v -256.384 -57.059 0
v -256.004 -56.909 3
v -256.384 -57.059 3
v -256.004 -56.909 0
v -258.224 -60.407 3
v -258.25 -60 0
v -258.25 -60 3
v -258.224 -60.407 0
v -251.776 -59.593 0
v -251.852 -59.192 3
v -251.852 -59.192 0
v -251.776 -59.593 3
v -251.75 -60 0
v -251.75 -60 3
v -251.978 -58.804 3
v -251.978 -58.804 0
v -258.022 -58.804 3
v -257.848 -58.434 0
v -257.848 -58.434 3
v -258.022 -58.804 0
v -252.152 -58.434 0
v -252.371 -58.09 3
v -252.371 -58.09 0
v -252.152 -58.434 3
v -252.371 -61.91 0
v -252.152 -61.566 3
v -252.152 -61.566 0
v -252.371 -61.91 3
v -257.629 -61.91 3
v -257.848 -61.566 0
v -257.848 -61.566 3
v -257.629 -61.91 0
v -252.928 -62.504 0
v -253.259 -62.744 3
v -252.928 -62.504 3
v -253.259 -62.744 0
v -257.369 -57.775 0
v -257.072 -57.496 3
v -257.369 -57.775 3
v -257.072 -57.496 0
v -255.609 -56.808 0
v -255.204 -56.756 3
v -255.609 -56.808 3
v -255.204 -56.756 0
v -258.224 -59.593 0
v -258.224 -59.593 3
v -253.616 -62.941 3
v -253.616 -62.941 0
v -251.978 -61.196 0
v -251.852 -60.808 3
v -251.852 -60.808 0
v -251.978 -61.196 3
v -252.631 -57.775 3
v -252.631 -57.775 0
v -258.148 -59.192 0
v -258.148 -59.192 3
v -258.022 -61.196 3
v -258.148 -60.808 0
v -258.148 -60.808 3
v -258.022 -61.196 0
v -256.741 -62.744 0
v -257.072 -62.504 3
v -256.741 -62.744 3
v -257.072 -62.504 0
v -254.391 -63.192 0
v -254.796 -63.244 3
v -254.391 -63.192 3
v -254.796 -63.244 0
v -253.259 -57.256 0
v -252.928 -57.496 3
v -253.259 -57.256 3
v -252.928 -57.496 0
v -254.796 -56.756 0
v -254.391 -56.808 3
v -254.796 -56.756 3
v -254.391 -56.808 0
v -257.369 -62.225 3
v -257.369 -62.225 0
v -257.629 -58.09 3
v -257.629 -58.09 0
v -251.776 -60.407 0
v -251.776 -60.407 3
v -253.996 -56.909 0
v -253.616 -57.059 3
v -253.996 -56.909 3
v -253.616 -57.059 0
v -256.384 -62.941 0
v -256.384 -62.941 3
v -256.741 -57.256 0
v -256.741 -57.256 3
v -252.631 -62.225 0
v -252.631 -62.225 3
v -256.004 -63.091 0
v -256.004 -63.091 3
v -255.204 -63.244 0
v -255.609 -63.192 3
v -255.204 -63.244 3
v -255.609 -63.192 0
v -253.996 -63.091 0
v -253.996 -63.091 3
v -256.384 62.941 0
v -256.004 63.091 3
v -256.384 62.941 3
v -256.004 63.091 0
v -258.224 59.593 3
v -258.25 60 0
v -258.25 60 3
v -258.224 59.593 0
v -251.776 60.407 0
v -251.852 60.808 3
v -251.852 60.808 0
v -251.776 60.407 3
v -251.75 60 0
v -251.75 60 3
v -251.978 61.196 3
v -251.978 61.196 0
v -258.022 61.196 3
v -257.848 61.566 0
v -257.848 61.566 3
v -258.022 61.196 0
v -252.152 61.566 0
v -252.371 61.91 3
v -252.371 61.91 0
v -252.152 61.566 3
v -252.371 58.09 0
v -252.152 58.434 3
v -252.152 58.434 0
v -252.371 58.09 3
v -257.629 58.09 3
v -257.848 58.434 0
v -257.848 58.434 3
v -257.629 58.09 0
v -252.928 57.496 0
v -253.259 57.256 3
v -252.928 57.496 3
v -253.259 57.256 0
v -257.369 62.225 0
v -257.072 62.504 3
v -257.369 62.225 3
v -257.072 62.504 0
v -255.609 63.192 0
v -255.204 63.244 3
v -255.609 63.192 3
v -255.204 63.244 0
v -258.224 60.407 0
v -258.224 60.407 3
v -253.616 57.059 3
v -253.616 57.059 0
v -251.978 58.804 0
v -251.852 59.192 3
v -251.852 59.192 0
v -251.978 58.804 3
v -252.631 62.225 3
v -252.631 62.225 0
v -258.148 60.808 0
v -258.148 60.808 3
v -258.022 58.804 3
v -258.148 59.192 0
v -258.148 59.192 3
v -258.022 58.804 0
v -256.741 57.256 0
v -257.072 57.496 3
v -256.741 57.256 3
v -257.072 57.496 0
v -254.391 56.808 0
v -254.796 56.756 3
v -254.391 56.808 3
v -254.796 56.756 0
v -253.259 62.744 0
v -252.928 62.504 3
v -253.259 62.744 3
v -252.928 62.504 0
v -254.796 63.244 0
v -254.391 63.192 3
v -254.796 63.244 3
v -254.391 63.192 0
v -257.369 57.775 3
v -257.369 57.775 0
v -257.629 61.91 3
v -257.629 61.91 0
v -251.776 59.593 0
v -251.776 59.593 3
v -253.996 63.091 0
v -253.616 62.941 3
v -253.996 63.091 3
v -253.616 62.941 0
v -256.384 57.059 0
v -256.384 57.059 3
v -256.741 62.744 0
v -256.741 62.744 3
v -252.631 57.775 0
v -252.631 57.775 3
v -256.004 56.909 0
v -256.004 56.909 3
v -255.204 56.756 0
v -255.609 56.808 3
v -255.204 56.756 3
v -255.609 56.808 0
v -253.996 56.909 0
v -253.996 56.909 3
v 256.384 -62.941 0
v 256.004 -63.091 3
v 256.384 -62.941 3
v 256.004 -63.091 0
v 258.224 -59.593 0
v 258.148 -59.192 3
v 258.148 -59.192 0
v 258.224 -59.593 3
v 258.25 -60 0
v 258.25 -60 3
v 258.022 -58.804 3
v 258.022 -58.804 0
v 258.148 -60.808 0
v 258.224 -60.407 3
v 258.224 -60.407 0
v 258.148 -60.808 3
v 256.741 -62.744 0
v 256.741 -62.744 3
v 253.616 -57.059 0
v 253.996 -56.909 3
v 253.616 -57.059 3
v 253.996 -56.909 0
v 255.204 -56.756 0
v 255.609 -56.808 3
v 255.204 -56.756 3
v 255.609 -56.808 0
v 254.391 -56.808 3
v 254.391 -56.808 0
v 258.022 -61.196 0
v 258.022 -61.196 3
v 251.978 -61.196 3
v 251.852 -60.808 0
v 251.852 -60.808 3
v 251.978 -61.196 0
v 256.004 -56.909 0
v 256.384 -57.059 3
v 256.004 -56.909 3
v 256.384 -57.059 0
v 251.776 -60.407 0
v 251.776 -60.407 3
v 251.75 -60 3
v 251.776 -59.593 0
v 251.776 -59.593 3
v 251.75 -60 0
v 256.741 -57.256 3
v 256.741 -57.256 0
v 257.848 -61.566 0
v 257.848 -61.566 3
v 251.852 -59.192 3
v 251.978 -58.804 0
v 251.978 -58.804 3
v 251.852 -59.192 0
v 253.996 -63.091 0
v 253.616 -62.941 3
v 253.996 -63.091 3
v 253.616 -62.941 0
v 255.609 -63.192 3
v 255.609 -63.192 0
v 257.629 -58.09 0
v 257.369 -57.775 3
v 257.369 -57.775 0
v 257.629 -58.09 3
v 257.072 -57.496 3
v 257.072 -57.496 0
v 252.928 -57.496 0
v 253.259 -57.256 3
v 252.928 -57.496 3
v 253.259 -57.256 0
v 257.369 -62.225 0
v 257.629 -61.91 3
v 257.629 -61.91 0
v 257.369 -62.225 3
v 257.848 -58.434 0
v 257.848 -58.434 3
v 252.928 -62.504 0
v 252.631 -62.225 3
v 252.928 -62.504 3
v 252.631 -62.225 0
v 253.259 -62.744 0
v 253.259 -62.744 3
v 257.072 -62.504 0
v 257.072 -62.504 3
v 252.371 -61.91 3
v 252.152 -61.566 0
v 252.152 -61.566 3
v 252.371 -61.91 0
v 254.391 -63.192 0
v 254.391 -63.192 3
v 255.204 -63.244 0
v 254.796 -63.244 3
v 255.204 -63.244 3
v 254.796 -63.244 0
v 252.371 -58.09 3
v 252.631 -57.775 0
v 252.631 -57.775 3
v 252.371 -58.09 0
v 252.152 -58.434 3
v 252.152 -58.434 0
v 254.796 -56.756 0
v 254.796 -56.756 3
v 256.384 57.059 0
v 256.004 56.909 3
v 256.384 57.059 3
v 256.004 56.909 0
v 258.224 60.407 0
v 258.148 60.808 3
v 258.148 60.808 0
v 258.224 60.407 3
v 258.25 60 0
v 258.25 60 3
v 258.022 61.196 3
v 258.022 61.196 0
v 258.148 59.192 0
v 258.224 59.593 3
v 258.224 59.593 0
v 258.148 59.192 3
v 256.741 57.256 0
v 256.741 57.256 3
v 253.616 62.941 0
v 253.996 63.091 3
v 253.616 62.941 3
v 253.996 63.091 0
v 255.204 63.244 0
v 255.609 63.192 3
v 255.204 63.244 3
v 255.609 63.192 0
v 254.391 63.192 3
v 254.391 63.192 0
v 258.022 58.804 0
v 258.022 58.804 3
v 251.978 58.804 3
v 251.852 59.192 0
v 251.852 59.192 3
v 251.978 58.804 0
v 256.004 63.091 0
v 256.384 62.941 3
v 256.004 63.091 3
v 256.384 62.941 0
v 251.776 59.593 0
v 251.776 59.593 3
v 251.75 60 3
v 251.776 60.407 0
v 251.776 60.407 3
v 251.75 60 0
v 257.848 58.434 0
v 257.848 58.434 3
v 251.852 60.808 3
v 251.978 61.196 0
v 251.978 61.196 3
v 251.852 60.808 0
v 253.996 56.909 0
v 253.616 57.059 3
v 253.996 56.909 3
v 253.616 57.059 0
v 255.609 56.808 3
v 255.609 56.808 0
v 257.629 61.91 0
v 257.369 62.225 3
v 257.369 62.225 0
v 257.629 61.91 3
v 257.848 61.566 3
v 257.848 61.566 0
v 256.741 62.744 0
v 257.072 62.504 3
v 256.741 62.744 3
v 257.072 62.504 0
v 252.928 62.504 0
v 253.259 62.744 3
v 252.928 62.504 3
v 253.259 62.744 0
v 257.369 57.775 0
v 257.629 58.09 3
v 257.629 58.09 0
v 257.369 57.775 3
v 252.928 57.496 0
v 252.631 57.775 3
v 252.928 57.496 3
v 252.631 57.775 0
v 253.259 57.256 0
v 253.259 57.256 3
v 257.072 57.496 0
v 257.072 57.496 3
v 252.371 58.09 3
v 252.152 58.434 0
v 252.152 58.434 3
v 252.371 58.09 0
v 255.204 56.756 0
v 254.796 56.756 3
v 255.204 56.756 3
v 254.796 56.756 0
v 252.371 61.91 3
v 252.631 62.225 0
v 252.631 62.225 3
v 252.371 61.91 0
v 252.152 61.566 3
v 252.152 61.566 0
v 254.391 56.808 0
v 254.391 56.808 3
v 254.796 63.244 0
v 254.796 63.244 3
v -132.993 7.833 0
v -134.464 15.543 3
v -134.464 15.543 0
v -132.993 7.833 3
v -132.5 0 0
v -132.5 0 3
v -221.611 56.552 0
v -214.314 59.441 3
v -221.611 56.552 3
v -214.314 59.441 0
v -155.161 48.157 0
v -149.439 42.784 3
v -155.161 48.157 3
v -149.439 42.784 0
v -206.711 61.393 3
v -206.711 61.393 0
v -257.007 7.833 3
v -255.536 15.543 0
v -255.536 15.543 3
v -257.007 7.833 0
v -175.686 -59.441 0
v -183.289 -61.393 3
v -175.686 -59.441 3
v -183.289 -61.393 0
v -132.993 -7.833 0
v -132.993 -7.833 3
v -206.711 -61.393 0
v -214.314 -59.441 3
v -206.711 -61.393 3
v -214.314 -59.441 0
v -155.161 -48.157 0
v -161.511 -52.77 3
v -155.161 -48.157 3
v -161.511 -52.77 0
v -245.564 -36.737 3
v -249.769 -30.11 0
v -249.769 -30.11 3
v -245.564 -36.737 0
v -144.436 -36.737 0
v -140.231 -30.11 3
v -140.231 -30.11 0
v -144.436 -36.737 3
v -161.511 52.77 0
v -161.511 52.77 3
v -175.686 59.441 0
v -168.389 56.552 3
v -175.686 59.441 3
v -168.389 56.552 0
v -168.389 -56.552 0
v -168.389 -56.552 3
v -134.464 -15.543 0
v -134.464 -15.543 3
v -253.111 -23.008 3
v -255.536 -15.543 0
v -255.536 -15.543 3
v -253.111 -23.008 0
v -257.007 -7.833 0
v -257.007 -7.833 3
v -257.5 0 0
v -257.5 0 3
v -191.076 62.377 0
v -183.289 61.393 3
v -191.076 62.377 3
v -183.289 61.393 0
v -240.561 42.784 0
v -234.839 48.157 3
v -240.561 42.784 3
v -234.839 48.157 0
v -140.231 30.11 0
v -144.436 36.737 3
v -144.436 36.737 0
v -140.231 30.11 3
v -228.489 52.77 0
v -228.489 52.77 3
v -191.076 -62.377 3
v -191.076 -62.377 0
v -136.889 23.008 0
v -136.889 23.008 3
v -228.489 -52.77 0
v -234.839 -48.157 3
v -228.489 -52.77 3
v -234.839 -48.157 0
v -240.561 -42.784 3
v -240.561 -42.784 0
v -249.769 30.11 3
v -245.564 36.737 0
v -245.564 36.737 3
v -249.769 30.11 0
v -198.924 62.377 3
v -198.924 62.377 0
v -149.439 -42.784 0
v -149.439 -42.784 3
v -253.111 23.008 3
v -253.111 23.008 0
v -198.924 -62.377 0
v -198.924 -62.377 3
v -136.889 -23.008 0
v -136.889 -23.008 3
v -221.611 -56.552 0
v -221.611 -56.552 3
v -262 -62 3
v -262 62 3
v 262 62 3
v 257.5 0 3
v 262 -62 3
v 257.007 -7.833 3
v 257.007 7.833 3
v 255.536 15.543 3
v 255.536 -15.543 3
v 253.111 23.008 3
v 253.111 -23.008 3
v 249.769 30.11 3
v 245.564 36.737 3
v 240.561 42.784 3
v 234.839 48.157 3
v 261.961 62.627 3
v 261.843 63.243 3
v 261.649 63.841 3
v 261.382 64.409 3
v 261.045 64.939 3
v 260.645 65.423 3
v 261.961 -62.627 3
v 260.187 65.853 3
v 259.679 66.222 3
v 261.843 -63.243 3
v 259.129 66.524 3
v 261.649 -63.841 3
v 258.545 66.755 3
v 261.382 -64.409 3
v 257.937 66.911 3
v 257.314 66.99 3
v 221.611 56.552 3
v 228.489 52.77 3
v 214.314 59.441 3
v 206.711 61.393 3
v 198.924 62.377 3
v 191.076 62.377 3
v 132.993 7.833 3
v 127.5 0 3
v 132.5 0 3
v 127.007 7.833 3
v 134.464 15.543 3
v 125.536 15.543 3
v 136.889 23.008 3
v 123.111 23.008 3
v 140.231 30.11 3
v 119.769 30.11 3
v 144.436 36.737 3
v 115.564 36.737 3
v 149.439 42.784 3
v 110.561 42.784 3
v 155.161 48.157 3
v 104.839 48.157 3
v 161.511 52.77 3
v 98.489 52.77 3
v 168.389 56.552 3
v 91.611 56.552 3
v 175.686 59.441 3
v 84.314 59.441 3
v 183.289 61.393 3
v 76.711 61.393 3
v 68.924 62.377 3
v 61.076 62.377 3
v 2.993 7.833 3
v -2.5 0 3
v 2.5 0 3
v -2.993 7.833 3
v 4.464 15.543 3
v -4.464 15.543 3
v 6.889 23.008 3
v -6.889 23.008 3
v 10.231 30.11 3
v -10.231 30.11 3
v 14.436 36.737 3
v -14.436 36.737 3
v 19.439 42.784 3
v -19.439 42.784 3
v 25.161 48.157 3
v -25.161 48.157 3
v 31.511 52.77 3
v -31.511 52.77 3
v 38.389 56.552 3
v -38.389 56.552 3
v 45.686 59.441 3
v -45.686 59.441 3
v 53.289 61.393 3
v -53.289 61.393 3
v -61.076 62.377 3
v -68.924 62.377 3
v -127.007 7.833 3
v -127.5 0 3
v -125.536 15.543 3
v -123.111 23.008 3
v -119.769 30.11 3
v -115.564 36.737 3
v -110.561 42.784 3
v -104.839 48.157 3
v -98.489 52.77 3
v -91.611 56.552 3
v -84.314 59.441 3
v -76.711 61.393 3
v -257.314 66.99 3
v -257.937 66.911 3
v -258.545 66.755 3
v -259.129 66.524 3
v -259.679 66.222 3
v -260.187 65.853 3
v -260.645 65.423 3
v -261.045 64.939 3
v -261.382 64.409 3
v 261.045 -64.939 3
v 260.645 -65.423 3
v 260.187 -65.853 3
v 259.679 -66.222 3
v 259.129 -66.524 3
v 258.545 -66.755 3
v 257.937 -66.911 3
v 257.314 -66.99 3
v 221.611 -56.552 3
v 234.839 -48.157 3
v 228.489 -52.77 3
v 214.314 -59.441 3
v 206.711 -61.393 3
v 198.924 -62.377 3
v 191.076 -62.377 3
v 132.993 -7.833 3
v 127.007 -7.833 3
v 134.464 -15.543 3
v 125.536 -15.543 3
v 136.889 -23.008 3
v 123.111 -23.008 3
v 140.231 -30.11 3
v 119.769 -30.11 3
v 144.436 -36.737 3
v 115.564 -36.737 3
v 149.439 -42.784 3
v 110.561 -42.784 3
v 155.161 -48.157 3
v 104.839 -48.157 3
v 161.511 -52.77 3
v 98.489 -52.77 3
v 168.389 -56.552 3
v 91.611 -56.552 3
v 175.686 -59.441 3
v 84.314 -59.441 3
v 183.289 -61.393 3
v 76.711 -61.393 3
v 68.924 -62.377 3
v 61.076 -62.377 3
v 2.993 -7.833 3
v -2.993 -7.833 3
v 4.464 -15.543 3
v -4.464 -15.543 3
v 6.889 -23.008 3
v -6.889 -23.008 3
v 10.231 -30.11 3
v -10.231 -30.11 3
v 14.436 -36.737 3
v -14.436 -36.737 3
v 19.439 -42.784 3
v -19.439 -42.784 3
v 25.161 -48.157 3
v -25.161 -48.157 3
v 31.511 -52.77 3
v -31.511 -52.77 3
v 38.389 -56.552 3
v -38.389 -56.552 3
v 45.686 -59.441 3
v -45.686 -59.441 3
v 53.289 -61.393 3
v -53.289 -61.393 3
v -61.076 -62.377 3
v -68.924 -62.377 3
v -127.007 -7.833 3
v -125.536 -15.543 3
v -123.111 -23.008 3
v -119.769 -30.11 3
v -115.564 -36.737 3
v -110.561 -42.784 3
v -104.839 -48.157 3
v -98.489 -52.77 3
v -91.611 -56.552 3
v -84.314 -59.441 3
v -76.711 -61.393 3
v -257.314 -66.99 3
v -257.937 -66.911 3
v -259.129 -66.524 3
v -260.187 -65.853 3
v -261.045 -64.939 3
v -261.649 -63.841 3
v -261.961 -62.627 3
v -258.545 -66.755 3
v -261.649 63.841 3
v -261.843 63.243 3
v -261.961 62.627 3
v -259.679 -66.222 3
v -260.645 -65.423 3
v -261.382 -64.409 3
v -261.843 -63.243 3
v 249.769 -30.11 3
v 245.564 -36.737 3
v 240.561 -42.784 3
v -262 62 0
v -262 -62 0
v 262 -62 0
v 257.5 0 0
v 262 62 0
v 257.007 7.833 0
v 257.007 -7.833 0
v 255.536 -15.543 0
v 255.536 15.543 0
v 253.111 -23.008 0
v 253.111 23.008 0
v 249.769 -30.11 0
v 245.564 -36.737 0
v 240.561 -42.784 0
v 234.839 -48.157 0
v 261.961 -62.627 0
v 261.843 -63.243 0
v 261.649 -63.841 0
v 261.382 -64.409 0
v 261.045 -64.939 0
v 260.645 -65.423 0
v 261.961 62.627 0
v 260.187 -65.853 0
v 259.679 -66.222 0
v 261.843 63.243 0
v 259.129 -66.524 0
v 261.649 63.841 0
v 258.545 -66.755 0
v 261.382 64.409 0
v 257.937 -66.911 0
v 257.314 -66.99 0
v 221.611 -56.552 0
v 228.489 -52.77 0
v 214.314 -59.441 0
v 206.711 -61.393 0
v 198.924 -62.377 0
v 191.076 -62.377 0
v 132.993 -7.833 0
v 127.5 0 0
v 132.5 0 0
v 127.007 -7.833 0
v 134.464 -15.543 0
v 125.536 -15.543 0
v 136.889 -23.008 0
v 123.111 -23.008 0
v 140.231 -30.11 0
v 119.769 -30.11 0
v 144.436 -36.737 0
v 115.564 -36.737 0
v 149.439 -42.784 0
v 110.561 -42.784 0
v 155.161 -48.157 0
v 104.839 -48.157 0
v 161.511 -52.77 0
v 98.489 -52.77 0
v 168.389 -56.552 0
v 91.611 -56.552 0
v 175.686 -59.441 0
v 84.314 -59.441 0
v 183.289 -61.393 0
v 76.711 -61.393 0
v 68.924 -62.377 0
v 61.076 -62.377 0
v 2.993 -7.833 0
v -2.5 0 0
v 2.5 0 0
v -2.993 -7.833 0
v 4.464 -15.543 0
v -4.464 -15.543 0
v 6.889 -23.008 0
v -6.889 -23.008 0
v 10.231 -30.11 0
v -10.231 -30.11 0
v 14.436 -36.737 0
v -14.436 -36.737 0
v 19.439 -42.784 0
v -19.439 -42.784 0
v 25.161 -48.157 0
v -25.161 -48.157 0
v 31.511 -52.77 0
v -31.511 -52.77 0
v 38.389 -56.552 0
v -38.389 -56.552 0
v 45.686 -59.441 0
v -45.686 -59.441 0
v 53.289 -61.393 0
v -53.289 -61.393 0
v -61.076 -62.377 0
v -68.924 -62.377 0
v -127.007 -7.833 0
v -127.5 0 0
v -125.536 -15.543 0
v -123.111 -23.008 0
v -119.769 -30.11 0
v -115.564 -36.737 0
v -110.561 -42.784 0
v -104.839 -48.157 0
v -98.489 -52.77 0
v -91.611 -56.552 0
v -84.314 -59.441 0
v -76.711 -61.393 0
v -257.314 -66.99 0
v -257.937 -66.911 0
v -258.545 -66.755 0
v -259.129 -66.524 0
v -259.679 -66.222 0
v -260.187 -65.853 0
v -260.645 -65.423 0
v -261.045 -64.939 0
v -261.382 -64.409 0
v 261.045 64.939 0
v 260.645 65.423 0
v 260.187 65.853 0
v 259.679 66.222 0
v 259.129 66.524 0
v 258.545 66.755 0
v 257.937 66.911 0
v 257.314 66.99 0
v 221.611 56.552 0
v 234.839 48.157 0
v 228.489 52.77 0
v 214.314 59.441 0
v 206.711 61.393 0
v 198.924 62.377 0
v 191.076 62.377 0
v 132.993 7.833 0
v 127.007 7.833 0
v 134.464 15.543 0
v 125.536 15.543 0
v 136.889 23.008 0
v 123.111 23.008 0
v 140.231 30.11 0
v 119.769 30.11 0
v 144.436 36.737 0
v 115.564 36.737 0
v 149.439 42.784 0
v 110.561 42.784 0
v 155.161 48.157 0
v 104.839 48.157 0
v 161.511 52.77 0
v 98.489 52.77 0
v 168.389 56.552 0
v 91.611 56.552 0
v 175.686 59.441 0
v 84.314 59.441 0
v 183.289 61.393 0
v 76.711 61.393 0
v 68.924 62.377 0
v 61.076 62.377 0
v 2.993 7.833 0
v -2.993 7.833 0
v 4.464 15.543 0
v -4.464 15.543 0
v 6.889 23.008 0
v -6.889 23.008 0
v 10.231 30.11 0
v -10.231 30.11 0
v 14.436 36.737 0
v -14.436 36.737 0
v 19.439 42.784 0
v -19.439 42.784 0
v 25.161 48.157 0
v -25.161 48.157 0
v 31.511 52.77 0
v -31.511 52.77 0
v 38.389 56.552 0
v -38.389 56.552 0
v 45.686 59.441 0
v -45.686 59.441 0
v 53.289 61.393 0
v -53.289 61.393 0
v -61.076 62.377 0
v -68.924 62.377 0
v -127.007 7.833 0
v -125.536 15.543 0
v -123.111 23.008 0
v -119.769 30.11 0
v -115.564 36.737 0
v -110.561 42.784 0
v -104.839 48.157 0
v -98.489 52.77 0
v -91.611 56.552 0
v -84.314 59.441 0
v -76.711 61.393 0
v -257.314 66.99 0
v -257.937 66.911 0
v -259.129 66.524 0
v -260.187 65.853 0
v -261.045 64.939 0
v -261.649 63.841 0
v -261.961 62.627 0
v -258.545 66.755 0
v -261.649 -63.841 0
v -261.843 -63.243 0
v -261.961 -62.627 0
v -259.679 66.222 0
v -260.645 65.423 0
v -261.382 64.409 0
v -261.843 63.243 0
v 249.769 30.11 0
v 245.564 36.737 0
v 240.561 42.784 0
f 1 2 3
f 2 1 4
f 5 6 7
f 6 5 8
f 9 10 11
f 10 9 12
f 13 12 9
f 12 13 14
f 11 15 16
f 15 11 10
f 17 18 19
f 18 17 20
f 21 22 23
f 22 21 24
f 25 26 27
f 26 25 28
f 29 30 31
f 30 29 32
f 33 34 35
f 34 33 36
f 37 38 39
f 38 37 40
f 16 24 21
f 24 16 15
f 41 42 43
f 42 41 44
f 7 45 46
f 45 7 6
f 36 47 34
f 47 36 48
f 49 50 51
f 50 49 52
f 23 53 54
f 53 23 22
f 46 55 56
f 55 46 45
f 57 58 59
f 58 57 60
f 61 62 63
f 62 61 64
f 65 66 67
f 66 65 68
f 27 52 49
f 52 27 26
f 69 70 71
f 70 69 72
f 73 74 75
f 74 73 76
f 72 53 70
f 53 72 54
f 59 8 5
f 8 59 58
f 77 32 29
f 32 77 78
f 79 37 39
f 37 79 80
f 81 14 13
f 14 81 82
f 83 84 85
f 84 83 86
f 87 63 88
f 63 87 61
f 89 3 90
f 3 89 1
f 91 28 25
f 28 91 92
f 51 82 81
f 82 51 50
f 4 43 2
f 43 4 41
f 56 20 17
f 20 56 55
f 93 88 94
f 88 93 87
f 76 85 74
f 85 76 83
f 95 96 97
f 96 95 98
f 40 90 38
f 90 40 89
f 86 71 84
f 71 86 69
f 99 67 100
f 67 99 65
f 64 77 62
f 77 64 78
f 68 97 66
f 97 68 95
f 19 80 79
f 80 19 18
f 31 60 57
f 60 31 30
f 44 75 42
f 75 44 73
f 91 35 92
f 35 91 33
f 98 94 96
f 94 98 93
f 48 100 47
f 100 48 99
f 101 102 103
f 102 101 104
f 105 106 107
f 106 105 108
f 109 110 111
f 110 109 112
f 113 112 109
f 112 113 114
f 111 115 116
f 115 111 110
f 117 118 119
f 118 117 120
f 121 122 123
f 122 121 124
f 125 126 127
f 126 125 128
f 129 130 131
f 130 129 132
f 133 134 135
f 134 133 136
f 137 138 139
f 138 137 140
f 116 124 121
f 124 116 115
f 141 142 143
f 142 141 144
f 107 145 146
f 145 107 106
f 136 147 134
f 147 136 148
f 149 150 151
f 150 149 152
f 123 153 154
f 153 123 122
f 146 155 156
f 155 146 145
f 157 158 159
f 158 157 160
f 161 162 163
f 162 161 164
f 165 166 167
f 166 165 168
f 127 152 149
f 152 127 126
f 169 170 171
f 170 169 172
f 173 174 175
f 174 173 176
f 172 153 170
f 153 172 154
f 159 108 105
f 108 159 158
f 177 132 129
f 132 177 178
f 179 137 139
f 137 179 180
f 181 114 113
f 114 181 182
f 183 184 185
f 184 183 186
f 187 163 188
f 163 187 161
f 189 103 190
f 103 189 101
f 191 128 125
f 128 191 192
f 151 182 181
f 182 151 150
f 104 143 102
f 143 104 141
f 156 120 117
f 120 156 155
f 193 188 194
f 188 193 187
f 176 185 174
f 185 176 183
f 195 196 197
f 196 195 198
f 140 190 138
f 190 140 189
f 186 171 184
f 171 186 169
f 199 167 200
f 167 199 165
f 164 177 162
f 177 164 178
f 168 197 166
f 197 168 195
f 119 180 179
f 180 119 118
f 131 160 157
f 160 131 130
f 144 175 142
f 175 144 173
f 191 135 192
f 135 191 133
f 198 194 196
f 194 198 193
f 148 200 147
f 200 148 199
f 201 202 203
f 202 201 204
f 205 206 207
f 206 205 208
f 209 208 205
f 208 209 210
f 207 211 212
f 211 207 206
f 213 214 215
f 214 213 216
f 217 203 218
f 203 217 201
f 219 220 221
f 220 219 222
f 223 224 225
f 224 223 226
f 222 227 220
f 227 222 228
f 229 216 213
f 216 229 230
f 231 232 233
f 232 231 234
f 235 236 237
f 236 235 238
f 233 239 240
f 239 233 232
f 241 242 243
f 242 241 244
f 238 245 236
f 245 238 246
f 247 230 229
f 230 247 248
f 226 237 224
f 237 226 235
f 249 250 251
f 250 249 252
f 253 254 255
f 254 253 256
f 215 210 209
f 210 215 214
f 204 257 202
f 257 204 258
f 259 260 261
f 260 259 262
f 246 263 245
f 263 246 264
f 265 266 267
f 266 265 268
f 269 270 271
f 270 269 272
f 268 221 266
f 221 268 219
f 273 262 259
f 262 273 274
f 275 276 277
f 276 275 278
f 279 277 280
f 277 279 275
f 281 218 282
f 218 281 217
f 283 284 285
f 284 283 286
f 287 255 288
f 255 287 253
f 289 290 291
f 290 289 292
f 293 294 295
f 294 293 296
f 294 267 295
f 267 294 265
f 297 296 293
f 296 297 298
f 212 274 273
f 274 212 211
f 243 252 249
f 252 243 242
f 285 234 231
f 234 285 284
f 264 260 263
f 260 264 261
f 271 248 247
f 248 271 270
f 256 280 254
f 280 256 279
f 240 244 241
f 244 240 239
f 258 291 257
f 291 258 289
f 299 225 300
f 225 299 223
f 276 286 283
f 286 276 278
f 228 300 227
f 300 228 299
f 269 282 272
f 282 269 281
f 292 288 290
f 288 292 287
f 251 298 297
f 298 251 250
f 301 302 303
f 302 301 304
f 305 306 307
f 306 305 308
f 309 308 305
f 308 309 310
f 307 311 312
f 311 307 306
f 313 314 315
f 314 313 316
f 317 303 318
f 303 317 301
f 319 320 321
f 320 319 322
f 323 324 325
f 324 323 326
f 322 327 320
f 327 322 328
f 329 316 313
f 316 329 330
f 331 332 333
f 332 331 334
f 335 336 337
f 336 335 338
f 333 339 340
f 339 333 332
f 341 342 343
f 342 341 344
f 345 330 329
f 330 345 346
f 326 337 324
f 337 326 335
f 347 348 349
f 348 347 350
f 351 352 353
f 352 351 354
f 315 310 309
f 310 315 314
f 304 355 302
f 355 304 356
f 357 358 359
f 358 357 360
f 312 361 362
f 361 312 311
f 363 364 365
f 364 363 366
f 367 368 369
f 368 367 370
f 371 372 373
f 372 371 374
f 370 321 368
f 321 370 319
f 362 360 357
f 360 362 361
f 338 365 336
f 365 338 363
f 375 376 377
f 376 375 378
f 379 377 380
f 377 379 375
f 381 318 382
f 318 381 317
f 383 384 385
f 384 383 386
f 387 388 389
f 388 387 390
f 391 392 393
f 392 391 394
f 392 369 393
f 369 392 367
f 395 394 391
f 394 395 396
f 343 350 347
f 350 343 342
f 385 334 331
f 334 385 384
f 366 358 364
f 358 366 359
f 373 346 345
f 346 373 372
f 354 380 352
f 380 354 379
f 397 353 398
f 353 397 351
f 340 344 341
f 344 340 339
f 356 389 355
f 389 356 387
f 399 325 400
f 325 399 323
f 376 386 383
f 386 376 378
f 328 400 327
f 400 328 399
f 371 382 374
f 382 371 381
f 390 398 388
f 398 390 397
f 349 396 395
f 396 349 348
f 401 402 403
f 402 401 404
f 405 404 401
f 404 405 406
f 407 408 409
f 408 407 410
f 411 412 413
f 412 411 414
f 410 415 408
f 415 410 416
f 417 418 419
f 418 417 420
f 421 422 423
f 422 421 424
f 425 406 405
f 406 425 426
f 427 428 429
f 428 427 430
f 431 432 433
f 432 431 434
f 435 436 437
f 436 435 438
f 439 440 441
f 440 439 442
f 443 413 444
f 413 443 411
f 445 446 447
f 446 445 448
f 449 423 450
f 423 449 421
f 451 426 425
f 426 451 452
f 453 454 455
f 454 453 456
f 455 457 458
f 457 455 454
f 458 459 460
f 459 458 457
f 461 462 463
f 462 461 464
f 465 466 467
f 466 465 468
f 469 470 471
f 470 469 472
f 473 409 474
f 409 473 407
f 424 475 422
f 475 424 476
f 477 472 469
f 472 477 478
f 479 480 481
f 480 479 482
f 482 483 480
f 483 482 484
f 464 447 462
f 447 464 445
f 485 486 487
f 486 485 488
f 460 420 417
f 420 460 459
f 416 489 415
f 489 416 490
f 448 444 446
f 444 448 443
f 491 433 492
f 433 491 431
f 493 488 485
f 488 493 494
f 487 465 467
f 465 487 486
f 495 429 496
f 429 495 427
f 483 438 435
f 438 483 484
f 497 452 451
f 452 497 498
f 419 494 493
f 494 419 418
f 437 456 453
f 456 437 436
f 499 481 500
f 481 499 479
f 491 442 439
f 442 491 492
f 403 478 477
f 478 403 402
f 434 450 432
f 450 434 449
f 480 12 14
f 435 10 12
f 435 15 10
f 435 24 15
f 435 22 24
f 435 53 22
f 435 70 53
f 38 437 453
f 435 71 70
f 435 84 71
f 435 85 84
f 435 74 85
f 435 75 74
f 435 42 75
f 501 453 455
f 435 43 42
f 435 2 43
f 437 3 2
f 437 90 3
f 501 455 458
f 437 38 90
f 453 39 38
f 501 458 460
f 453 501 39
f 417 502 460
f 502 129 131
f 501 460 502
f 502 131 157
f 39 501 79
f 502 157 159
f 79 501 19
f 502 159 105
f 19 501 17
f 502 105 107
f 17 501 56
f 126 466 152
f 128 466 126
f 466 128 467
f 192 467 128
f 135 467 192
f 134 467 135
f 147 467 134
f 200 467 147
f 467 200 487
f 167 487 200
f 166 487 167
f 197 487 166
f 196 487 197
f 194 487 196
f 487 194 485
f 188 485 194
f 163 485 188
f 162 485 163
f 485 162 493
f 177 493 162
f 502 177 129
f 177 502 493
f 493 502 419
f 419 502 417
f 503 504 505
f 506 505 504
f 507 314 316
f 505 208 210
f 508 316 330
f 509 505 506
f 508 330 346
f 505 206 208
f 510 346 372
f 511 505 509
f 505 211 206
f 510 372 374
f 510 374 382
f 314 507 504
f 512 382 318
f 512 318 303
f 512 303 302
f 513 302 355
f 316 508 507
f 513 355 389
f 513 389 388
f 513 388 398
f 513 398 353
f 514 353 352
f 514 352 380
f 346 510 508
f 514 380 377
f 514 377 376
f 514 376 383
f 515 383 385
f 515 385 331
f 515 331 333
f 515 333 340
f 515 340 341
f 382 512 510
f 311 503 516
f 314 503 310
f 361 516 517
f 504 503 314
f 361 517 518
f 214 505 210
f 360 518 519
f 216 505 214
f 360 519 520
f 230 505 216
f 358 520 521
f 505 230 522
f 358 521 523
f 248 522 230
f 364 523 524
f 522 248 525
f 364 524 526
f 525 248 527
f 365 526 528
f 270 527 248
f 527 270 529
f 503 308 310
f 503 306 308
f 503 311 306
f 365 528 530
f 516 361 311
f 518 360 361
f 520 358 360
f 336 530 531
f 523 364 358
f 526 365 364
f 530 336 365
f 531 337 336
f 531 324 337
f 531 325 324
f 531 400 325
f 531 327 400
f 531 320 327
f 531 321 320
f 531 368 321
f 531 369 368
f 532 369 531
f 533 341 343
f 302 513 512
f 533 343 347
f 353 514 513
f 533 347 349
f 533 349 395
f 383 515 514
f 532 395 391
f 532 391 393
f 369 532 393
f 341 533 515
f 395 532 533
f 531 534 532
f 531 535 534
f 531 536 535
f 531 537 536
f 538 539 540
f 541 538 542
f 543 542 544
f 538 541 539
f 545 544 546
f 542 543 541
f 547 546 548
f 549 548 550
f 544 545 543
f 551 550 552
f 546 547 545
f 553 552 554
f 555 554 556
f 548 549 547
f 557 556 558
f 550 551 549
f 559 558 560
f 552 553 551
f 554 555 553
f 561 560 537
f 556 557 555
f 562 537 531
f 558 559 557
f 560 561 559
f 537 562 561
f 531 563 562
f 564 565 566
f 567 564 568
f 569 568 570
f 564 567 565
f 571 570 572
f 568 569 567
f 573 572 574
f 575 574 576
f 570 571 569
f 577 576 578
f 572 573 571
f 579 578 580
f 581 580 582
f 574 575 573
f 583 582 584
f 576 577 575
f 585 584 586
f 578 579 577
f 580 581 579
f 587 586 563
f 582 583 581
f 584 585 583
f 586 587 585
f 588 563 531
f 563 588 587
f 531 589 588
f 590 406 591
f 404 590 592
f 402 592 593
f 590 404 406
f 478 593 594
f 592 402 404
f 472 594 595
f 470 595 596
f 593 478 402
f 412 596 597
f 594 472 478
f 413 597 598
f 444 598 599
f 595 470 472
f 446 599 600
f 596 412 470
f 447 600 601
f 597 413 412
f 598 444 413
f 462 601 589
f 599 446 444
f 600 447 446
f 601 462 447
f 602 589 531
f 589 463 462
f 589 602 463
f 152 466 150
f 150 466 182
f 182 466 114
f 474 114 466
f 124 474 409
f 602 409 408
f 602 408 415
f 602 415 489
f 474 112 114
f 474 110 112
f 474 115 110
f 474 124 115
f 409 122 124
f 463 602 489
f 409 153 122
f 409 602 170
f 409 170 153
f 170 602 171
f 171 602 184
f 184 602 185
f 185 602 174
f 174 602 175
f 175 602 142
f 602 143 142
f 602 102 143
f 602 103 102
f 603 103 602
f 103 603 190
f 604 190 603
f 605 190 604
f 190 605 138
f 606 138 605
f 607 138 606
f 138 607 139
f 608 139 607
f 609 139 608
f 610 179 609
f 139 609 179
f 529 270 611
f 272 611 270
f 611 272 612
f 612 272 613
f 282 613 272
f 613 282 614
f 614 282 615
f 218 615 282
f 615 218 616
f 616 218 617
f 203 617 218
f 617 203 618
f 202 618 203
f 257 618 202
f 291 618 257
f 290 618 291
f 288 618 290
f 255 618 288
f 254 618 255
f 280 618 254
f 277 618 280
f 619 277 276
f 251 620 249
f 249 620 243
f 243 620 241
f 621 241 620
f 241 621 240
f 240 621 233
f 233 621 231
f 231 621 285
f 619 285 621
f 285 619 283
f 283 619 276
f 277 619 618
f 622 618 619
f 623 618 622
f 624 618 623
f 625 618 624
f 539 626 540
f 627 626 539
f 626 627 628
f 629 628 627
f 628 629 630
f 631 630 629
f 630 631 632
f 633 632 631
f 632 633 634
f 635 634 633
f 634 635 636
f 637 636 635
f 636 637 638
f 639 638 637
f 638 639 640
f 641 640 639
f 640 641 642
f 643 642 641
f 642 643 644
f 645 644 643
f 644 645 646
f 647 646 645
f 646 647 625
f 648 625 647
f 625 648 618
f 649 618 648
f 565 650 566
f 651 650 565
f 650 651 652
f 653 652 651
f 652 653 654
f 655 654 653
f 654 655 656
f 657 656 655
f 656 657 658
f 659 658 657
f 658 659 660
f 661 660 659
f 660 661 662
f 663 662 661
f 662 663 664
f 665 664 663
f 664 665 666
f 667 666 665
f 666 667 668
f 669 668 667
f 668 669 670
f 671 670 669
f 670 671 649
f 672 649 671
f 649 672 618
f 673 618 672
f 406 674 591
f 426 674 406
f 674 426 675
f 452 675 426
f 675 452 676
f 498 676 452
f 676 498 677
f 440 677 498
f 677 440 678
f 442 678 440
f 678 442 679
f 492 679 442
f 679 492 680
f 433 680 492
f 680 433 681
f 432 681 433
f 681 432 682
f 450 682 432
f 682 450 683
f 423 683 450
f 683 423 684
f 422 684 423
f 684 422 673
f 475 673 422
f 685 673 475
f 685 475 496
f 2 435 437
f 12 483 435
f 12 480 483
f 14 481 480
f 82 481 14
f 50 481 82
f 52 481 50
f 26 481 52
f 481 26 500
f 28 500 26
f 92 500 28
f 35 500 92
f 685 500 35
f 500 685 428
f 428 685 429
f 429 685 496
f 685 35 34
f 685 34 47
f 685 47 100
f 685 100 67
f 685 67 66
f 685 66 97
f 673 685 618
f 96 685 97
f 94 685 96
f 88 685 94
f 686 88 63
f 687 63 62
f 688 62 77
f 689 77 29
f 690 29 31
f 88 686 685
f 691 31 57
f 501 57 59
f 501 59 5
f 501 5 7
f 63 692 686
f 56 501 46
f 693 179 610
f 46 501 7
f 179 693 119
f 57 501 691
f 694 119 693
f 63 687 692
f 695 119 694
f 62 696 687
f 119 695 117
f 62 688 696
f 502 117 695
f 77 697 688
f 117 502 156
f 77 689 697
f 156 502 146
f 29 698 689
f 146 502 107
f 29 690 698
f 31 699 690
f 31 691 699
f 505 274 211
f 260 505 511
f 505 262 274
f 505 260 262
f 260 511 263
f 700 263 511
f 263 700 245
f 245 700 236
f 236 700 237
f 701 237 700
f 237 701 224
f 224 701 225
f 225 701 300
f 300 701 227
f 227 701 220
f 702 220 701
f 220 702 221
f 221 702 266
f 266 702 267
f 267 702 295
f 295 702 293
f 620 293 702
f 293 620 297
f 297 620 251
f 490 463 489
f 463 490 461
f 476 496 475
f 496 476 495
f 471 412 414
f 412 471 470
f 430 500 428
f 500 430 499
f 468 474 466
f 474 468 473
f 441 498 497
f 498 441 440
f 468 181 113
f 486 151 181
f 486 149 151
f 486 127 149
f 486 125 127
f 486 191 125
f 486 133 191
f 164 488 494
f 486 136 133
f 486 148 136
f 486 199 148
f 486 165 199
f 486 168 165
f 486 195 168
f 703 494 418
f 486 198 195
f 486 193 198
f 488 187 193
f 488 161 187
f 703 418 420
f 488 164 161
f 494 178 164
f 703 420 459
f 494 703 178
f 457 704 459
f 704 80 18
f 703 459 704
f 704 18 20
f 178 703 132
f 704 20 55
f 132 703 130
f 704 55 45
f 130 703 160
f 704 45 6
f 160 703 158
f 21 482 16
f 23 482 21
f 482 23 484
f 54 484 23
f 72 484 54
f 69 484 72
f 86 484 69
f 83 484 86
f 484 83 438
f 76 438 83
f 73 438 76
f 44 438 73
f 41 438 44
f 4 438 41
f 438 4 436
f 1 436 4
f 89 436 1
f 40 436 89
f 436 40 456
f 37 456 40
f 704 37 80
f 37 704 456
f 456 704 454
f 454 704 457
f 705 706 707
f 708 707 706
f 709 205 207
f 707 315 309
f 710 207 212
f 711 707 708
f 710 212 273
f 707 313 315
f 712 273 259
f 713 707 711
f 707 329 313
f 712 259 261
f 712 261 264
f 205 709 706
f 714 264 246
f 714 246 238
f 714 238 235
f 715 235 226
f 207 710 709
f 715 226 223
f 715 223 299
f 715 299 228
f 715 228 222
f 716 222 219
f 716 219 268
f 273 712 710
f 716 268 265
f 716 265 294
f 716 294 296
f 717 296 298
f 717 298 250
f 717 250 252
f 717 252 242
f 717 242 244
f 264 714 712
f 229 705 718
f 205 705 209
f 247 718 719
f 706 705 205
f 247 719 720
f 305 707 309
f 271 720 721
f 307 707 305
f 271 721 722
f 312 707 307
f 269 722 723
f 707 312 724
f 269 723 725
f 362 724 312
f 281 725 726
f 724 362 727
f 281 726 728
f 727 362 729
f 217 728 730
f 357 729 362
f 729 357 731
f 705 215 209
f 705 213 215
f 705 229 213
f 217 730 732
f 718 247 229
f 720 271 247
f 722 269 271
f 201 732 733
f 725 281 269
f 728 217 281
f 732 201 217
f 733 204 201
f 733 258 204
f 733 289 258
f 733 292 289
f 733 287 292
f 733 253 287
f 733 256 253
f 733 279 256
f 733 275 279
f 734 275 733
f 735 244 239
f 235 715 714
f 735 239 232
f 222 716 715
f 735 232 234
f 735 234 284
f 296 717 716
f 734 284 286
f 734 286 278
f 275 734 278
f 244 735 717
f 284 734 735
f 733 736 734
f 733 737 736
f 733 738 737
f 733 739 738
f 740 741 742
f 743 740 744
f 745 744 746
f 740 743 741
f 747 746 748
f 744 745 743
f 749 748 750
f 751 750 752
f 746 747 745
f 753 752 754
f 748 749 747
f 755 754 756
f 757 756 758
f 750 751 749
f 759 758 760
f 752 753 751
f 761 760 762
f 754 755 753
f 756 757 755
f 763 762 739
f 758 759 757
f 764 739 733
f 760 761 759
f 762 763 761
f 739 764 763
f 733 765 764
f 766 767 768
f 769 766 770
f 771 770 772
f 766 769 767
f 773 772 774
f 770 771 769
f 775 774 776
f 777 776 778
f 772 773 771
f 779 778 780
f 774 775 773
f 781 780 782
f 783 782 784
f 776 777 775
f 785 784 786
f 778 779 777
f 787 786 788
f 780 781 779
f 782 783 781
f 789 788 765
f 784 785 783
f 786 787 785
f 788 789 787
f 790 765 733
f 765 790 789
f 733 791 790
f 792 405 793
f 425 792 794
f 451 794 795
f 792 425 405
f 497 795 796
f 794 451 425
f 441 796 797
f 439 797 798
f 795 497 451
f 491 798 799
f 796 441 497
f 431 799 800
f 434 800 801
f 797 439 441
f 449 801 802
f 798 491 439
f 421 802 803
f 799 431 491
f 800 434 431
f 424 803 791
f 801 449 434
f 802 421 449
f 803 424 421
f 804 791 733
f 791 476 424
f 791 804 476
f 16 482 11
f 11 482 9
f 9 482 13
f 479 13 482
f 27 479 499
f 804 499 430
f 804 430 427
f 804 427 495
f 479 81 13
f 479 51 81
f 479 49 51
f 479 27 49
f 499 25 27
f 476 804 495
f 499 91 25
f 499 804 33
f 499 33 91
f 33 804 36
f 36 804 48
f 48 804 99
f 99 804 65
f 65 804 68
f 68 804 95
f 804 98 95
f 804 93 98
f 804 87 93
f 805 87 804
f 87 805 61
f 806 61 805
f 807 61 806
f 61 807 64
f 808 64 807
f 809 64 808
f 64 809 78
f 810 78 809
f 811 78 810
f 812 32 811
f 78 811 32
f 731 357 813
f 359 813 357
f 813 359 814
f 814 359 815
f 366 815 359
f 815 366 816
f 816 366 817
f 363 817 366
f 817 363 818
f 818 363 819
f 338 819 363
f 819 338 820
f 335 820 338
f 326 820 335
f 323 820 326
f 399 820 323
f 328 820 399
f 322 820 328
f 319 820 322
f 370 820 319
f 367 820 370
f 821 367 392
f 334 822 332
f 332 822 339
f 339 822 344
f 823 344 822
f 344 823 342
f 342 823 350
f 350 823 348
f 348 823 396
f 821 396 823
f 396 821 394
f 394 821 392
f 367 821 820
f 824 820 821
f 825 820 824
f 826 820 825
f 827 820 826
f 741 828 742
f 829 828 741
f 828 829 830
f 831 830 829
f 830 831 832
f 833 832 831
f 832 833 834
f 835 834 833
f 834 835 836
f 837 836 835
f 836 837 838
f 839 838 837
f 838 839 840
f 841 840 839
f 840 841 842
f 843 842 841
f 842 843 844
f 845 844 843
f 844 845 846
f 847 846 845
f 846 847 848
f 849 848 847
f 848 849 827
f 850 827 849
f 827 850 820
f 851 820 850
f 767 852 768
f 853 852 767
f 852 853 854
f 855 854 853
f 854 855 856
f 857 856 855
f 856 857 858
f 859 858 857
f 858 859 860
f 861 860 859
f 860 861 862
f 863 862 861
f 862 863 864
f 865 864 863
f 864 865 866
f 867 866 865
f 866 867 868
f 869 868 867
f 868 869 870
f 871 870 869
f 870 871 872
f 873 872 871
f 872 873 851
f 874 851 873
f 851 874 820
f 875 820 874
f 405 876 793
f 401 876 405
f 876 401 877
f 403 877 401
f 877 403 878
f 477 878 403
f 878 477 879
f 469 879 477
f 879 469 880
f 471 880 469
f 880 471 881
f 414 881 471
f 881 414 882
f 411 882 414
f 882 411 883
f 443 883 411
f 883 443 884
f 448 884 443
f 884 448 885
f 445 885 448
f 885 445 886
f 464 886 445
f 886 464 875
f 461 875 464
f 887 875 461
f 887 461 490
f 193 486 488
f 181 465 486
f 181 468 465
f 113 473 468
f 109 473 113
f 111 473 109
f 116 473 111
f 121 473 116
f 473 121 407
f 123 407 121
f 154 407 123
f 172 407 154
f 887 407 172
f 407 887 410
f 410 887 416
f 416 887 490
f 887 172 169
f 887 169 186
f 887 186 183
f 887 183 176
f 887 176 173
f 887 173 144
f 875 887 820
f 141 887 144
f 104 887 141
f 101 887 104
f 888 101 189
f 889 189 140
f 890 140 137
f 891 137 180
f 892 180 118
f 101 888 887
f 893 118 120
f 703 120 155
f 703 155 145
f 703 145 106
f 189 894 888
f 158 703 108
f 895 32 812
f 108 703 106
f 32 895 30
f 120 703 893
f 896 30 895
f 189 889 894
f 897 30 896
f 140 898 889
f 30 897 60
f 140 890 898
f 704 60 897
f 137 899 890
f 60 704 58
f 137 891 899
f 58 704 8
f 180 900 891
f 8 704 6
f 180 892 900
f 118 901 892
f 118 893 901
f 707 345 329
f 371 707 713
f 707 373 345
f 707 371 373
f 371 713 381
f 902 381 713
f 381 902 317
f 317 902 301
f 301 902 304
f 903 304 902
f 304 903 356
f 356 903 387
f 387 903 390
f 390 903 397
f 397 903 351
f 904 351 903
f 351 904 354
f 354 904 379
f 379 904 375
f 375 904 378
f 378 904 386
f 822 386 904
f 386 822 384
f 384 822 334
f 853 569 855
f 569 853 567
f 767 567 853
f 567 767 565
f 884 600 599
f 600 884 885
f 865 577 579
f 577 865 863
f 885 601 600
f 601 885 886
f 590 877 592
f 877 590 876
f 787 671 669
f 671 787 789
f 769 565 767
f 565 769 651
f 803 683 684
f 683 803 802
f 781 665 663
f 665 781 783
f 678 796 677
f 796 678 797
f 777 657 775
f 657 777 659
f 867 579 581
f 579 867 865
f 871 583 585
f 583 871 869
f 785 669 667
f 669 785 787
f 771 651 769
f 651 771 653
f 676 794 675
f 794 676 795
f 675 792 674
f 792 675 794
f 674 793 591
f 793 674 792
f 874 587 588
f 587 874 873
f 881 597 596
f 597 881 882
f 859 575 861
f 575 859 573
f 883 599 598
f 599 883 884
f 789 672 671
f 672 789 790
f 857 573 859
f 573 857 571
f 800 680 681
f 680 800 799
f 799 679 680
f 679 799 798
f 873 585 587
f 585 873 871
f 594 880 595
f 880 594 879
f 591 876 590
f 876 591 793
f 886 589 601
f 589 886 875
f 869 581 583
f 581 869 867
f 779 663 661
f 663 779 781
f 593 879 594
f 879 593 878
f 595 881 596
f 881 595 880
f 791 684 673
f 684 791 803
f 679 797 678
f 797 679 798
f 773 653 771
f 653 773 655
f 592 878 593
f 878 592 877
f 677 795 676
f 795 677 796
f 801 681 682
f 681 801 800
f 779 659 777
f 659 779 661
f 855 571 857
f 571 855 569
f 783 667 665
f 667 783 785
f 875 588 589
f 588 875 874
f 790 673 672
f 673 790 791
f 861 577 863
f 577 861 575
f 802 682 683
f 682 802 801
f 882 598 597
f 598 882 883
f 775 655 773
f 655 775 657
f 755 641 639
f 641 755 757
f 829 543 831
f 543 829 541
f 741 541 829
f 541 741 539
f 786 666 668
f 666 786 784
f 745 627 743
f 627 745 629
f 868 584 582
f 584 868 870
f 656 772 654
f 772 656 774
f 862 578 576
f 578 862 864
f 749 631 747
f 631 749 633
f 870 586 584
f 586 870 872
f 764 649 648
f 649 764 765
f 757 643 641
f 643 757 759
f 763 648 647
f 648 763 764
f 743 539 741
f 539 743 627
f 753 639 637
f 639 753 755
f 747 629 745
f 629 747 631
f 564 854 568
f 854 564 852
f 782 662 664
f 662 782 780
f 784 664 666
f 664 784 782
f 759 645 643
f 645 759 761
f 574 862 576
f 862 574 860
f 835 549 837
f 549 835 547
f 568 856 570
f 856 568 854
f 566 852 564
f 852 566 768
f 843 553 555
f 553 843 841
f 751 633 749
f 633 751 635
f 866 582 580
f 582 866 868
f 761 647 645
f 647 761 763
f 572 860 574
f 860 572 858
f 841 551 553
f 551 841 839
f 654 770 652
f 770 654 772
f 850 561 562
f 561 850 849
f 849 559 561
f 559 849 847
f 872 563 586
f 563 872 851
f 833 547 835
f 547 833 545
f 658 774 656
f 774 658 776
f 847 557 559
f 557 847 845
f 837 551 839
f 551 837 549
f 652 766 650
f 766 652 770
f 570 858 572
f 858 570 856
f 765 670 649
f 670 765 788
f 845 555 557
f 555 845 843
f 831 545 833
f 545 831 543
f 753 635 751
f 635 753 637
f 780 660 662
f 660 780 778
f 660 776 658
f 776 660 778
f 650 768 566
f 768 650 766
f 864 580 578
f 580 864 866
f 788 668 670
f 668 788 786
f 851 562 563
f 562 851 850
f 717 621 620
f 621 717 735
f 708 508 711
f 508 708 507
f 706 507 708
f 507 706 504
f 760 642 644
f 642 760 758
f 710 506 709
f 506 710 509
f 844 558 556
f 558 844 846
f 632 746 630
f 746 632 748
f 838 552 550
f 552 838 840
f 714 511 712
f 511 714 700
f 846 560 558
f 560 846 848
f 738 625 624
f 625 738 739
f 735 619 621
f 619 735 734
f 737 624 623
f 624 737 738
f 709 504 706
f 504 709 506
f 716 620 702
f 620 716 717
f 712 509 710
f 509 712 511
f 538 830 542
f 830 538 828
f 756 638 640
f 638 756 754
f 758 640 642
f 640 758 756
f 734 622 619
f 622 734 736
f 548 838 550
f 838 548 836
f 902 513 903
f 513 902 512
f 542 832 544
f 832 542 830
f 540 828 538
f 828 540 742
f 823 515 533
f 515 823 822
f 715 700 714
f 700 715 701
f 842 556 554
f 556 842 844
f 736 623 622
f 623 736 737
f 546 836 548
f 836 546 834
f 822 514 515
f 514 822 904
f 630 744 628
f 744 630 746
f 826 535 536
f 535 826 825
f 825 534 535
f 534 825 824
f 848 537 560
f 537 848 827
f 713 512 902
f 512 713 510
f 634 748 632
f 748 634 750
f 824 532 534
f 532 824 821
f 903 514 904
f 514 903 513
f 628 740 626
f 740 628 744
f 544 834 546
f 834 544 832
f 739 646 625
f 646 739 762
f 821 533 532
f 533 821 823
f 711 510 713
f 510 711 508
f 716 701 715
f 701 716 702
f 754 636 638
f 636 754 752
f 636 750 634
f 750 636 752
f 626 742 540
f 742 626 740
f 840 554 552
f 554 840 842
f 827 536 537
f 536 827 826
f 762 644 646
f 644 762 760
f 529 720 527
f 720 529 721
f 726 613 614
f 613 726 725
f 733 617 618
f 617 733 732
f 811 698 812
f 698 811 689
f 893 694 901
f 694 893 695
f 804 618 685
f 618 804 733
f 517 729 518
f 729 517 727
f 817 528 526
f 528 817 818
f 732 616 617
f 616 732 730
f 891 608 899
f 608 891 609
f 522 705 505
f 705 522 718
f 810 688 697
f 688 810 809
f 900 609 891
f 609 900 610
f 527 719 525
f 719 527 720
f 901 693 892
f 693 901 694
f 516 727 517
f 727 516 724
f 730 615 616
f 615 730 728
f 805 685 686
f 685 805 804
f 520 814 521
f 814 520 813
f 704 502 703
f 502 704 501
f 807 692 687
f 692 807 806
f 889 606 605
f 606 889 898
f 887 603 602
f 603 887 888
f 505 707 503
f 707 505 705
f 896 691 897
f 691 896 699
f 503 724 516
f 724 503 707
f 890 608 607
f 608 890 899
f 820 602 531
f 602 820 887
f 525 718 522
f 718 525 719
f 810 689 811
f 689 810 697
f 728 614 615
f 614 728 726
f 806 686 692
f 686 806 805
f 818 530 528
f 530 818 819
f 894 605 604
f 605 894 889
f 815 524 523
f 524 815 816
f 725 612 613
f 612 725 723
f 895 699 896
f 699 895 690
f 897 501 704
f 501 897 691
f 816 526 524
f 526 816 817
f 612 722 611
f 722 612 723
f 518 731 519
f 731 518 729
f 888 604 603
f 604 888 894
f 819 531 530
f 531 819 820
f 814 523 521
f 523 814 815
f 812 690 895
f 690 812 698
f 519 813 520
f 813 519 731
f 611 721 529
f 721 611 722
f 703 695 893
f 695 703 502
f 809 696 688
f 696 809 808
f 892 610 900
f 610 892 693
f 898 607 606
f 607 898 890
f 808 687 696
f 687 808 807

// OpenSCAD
$fn = 50;


difference() {
	union() {
		hull() {
			translate(v = [-257.0000000000, 62.0000000000, 0]) {
				cylinder(h = 3, r = 5);
			}
			translate(v = [257.0000000000, 62.0000000000, 0]) {
				cylinder(h = 3, r = 5);
			}
			translate(v = [-257.0000000000, -62.0000000000, 0]) {
				cylinder(h = 3, r = 5);
			}
			translate(v = [257.0000000000, -62.0000000000, 0]) {
				cylinder(h = 3, r = 5);
			}
		}
	}
	union() {
		#translate(v = [-255.0000000000, -60.0000000000, -100.0000000000]) {
			cylinder(h = 200, r = 3.2500000000);
		}
		#translate(v = [-255.0000000000, 60.0000000000, -100.0000000000]) {
			cylinder(h = 200, r = 3.2500000000);
		}
		#translate(v = [255.0000000000, -60.0000000000, -100.0000000000]) {
			cylinder(h = 200, r = 3.2500000000);
		}
		#translate(v = [255.0000000000, 60.0000000000, -100.0000000000]) {
			cylinder(h = 200, r = 3.2500000000);
		}
		#translate(v = [-195.0000000000, 0, 0]) {
			cylinder(h = 3, r = 62.5000000000);
		}
		#translate(v = [-65.0000000000, 0, 0]) {
			cylinder(h = 3, r = 62.5000000000);
		}
		#translate(v = [65.0000000000, 0, 0]) {
			cylinder(h = 3, r = 62.5000000000);
		}
		#translate(v = [195.0000000000, 0, 0]) {
			cylinder(h = 3, r = 62.5000000000);
		}
	}
}
